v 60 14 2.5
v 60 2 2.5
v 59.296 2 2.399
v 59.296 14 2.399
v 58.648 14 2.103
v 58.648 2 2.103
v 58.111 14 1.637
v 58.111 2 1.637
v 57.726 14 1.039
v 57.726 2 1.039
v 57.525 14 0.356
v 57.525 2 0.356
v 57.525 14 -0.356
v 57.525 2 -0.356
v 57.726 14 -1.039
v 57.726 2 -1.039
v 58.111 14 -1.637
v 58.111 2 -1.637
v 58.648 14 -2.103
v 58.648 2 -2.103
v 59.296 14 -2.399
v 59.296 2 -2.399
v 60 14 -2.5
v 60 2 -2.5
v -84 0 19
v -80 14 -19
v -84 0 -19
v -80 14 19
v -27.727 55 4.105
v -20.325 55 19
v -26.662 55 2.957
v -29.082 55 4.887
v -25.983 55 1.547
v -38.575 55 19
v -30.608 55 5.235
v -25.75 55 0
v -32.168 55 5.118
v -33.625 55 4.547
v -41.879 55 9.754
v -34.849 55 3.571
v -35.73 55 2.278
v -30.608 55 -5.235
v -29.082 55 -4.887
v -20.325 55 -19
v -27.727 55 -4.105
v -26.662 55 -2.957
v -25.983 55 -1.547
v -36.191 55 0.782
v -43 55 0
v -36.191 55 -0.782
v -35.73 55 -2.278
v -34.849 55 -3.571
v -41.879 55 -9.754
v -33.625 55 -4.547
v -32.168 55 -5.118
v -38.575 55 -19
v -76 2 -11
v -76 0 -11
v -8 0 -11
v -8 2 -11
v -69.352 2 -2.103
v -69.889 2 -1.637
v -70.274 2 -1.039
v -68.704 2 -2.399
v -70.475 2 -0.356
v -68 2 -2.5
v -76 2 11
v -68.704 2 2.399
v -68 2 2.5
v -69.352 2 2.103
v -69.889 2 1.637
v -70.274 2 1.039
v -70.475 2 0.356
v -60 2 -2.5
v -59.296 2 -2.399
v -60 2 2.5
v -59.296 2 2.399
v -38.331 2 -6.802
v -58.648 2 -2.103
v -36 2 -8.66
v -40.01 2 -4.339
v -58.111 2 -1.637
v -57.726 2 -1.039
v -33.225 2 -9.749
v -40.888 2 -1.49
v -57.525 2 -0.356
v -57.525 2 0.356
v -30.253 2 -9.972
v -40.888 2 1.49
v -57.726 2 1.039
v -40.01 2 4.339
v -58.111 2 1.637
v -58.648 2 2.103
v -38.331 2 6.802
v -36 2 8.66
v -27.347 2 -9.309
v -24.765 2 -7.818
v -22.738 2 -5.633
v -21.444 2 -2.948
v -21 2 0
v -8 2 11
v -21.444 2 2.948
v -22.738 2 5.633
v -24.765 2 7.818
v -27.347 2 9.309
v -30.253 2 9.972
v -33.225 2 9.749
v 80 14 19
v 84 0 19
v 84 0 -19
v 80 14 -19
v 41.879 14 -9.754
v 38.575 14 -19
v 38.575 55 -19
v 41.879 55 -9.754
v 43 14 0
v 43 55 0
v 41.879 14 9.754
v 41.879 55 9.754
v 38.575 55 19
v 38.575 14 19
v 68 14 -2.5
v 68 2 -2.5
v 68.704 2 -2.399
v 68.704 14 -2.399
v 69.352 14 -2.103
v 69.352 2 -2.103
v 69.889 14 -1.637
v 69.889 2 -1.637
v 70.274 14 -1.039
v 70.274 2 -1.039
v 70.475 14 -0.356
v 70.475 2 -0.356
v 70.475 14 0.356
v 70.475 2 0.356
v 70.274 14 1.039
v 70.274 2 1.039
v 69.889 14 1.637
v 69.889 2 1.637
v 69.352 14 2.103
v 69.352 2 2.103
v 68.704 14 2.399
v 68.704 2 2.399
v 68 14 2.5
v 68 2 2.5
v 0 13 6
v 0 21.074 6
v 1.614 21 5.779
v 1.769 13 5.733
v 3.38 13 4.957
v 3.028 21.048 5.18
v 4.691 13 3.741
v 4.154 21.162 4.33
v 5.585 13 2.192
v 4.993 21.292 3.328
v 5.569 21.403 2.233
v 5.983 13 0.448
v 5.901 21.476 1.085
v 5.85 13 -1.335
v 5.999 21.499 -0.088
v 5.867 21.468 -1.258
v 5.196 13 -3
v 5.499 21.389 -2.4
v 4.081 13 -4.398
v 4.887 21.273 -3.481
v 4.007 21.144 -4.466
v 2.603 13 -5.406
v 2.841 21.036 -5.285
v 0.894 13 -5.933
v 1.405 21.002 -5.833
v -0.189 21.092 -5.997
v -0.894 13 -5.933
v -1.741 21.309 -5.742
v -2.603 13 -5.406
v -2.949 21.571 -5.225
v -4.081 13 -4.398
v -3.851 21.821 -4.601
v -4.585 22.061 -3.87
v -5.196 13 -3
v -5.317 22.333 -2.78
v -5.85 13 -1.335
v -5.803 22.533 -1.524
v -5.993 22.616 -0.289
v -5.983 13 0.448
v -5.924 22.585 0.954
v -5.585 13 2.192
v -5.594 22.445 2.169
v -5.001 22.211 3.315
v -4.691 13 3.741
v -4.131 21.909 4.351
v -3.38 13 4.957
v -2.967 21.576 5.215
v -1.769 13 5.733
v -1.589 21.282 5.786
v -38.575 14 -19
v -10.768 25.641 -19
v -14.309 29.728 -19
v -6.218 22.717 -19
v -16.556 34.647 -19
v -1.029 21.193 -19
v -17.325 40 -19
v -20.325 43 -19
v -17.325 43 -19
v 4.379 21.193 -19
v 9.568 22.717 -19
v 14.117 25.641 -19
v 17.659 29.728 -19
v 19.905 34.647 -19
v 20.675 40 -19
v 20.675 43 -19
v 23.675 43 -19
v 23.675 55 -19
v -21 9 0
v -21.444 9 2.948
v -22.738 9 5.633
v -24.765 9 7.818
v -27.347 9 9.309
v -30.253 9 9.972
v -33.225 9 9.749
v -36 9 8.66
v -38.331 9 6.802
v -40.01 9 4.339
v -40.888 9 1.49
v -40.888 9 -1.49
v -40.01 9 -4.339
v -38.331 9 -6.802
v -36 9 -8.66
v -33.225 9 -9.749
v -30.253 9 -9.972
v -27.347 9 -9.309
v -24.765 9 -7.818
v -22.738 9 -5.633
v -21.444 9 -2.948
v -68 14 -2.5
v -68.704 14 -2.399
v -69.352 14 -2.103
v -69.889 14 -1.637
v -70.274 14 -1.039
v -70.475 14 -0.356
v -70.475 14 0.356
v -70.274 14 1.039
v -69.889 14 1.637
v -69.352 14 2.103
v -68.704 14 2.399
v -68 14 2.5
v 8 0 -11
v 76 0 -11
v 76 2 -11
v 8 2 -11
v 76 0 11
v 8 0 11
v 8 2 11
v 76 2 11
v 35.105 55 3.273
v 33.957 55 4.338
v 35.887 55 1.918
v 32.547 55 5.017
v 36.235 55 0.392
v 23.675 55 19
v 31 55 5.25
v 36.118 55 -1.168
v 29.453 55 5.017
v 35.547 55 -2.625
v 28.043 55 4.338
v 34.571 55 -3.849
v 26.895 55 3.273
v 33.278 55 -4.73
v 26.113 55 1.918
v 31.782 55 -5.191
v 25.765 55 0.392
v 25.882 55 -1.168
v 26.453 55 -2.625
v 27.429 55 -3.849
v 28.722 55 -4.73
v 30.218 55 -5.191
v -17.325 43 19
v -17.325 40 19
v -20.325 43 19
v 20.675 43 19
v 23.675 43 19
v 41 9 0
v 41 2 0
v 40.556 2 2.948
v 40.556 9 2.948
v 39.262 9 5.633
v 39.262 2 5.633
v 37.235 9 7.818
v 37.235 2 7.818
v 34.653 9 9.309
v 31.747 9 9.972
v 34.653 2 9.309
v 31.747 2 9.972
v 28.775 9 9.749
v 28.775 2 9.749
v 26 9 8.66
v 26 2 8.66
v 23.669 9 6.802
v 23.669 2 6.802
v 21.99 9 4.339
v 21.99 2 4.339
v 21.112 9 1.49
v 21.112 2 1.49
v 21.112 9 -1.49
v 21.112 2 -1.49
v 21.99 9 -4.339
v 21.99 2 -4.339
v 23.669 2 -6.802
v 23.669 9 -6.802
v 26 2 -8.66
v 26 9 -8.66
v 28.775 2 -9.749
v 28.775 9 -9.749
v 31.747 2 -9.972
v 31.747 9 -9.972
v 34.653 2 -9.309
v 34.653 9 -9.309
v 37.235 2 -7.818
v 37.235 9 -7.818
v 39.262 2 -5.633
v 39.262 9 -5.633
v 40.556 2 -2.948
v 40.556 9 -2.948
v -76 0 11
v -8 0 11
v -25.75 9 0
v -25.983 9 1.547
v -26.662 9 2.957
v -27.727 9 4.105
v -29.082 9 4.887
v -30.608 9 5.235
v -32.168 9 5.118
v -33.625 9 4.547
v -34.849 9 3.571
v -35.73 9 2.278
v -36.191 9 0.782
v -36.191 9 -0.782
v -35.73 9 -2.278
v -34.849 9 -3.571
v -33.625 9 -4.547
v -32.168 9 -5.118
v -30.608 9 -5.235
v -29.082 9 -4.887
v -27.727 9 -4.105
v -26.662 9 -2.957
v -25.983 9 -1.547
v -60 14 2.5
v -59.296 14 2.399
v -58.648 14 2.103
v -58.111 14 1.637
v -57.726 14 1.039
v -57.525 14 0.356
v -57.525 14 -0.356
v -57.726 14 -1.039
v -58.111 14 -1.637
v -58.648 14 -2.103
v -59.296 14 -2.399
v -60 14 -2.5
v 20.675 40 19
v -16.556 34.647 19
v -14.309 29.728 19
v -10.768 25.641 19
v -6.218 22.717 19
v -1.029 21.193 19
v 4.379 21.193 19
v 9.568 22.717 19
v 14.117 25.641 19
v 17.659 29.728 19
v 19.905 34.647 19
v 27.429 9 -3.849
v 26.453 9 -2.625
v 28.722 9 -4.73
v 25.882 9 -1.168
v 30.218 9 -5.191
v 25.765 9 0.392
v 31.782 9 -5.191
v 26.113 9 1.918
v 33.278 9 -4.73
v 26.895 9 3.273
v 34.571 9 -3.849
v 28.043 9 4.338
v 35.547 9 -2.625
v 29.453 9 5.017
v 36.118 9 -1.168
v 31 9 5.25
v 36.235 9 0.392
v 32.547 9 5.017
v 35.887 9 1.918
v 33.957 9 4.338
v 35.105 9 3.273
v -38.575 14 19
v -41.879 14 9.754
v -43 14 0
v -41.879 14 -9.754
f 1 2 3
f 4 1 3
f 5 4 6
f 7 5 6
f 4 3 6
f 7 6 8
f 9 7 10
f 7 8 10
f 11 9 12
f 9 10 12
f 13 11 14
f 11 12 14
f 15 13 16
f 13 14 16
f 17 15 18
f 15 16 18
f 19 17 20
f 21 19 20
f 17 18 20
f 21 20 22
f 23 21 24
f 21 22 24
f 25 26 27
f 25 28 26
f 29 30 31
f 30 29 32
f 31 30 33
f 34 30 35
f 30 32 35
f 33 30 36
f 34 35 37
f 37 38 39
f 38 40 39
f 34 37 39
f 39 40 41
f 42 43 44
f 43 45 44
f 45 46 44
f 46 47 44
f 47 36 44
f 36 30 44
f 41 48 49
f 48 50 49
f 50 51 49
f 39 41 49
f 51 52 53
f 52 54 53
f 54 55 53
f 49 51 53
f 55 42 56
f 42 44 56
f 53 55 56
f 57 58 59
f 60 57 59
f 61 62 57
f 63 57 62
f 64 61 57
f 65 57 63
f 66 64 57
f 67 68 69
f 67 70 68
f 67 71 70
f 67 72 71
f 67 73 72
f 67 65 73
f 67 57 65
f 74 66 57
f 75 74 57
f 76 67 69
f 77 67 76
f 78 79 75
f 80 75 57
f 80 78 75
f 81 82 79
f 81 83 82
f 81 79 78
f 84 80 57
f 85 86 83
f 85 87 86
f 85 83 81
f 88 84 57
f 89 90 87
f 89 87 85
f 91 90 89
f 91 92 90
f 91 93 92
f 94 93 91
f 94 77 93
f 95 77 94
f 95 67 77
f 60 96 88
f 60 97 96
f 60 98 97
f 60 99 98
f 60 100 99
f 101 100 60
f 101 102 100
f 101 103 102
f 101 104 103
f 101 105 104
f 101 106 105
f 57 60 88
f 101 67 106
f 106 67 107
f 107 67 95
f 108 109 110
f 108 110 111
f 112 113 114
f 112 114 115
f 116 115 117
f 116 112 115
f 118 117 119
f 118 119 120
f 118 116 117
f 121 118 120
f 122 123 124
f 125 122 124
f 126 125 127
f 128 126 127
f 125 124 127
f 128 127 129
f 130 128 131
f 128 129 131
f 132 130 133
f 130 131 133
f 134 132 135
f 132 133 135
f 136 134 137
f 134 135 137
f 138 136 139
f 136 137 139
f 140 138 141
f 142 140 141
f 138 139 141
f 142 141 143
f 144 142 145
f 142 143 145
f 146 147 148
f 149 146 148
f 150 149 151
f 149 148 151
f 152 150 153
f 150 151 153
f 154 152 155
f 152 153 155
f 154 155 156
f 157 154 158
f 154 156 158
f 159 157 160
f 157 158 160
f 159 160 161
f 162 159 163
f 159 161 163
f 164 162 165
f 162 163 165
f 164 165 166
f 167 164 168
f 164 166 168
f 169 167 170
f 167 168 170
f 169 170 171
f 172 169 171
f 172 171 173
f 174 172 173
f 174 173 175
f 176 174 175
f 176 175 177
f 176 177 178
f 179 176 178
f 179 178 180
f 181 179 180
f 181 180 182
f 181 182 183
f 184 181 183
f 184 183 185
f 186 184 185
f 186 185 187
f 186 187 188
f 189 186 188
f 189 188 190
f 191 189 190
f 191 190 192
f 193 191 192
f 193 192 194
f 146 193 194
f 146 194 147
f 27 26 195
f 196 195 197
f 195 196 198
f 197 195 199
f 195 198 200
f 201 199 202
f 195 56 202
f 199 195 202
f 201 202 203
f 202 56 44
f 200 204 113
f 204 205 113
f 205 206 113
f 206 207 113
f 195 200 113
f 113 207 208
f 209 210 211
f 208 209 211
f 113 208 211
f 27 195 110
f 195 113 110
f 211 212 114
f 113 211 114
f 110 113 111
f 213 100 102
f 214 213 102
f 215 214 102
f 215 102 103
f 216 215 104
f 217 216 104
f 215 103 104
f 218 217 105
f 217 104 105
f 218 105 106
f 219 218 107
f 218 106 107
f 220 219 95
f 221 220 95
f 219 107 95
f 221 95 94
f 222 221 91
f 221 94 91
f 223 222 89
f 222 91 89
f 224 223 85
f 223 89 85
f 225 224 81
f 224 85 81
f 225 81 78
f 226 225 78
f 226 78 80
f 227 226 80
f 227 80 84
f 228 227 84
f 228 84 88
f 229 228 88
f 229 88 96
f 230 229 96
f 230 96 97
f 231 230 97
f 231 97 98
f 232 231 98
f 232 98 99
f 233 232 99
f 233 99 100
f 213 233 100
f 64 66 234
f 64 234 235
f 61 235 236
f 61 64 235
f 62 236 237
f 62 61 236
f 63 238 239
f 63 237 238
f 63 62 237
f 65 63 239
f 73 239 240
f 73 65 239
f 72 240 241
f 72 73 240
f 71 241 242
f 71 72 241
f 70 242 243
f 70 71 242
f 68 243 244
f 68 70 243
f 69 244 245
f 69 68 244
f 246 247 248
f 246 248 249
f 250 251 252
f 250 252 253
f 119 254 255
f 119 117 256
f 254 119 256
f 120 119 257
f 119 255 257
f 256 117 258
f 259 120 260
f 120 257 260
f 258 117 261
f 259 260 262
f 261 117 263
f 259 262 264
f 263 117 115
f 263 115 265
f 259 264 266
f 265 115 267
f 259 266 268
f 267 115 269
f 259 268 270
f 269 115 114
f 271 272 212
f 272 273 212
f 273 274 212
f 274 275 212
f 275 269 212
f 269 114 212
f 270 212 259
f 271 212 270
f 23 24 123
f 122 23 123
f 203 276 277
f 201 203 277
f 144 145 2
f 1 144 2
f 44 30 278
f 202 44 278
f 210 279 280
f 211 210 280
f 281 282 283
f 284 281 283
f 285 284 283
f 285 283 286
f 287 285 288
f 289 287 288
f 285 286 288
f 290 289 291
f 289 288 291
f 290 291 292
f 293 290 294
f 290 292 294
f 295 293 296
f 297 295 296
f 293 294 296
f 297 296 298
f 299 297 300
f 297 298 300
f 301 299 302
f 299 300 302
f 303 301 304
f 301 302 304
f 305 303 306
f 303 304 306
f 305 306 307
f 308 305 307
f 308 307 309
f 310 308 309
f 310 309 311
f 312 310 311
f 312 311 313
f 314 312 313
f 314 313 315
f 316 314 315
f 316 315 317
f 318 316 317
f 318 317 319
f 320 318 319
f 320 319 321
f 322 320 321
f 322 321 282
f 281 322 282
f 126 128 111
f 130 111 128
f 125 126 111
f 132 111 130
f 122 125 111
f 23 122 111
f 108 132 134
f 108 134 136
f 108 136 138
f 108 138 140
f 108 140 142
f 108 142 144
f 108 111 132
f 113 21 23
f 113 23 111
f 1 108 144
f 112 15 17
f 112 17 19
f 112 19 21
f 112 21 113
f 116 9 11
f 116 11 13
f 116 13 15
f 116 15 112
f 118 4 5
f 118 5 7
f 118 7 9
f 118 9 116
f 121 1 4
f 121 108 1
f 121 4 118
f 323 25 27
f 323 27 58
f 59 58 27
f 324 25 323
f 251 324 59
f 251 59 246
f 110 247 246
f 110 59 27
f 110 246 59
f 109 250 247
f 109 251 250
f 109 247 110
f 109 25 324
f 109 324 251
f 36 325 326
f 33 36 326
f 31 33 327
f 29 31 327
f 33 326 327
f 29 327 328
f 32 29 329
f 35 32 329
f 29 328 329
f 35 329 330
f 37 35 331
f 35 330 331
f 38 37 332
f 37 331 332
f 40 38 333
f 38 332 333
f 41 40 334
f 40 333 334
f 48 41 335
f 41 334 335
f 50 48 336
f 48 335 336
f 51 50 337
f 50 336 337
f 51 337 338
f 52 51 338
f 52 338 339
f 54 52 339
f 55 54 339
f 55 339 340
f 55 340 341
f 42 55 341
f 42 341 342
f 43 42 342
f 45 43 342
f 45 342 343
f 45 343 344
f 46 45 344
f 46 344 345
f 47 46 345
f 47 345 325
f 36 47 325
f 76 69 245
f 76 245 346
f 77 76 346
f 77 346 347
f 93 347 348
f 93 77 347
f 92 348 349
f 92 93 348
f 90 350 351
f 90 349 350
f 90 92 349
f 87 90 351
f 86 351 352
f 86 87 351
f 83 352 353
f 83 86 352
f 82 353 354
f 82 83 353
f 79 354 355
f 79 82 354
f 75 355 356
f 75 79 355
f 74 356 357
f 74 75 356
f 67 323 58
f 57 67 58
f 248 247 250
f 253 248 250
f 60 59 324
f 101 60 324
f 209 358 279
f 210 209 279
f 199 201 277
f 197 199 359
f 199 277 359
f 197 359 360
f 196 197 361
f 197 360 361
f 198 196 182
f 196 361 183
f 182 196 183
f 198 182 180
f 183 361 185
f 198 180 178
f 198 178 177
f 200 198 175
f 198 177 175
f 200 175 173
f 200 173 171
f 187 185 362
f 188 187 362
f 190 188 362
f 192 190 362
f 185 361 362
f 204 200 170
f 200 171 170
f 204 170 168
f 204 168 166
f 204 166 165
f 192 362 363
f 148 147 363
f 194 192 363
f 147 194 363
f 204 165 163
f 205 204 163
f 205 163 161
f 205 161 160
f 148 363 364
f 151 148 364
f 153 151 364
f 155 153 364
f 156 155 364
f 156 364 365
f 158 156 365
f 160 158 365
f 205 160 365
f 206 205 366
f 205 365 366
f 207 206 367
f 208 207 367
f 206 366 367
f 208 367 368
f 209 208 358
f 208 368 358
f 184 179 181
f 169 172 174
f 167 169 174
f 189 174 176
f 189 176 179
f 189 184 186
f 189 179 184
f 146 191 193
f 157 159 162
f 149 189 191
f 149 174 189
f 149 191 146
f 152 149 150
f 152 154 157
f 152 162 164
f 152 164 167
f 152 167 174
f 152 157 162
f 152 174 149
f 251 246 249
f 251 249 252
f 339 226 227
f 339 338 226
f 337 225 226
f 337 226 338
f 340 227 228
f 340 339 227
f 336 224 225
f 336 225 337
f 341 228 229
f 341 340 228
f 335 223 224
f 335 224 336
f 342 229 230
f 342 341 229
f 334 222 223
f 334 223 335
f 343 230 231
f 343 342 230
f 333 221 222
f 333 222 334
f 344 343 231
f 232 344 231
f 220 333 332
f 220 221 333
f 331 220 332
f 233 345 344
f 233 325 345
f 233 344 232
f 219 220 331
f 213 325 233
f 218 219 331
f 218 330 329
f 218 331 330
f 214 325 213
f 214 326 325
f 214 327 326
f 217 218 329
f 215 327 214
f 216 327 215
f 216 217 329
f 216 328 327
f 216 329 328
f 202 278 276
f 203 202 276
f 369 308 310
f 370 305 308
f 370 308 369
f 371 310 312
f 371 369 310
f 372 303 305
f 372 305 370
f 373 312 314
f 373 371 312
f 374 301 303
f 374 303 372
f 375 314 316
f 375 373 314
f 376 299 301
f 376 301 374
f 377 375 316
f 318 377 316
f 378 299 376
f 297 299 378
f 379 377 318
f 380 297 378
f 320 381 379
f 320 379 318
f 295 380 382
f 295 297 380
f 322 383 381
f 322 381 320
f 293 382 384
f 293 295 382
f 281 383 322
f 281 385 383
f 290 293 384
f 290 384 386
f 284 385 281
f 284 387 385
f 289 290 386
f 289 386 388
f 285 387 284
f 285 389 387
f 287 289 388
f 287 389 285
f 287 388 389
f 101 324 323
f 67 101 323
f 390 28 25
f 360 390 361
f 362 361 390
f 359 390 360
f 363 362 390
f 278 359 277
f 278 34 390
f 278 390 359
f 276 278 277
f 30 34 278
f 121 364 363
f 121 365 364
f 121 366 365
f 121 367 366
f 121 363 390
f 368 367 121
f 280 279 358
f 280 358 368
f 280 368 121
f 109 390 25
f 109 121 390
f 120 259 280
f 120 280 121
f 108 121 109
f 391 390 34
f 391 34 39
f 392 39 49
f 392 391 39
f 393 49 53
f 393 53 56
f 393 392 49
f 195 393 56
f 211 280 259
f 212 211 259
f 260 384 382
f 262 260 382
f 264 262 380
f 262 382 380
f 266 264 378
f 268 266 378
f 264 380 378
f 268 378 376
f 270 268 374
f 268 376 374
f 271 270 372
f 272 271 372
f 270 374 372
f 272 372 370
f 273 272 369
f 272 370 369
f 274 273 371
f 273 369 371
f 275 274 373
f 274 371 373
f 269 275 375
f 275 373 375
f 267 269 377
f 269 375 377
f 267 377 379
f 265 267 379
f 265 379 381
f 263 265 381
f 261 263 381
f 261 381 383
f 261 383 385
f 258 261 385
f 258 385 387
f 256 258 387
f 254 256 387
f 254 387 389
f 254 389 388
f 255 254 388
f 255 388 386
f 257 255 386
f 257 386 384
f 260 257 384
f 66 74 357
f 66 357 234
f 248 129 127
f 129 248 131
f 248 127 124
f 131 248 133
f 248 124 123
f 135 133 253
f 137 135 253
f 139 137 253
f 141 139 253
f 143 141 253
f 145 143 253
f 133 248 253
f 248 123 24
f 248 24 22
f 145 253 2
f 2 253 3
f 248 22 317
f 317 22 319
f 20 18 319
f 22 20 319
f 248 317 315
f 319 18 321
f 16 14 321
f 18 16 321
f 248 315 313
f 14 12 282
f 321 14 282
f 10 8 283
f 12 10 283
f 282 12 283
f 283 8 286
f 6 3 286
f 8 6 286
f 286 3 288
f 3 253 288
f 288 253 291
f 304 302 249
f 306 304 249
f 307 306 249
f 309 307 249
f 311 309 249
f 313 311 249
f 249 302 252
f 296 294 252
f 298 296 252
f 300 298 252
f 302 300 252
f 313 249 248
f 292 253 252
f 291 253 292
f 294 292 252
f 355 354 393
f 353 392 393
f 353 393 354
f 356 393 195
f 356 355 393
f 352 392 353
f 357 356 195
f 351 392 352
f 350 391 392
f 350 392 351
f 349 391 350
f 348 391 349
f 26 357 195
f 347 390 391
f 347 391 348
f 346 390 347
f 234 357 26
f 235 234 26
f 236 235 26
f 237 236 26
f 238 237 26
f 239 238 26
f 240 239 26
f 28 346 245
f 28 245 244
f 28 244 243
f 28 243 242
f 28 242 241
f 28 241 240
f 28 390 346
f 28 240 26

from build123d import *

# Parameters (mm, degrees)
BOSS_EXTRUDE1_DEPTH = 19
CUT_EXTRUDE2_DEPTH  = 2
BOSS_EXTRUDE2_DEPTH = 41
CUT_EXTRUDE3_DEPTH  = 62
SKETCH6_R           = 5.25
CUT_EXTRUDE4_DEPTH  = 72
SKETCH7_R           = 10
CUT_EXTRUDE5_DEPTH  = 9
SKETCH8_R           = 6
CUT_EXTRUDE6_DEPTH  = 42


with BuildPart() as part:
    # Sketch2 → Boss-Extrude1 (new, symmetric)
    with BuildSketch(Plane.XY):
        Polygon((-84, 0), (0, 0), (84, 0), (80, 14), (-80, 14), align=None)
    extrude(amount=BOSS_EXTRUDE1_DEPTH, both=True)

    # Sketch3 → Cut-Extrude2 (cut)
    with BuildSketch(Plane.XZ):
        Polygon((-76, 11), (-76, 0), (-76, -11), (-8, -11), (-8, 11), align=None)
        Polygon((76, 0), (76, -11), (8, -11), (8, 11), (76, 11), align=None)
    extrude(amount=-CUT_EXTRUDE2_DEPTH, mode=Mode.SUBTRACT)

    # Sketch4 → Boss-Extrude2 (add)
    with BuildSketch(Plane(origin=(0, 14, 0), x_dir=(1, 0, 0), z_dir=(0, 1, 0))):
        with BuildLine():
            Line((-38.574603044, 19), (38.574603044, 19))
            ThreePointArc((38.574603044, 19), (43, 0), (38.574603044, -19))
            Line((38.574603044, -19), (-38.574603044, -19))
            ThreePointArc((-38.574603044, -19), (-43, 0), (-38.574603044, 19))
        make_face()
    extrude(amount=BOSS_EXTRUDE2_DEPTH)

    # Sketch5 → Cut-Extrude3 (cut)
    with BuildSketch(Plane.XY.offset(19)):
        with BuildLine():
            Line((20.674705774, 39.999892181), (20.674705774, 43))
            Line((20.674705774, 43), (23.674705774, 43))
            Line((23.674705774, 43), (23.674705774, 55))
            Line((23.674705774, 55), (-20.325294226, 55))
            Line((-20.325294226, 55), (-20.325294226, 43))
            Line((-20.325294226, 43), (-17.325294226, 43))
            Line((-17.325294226, 43), (-17.325294226, 39.999892181))
            ThreePointArc((-17.325294226, 39.999892181), (1.674705774, 20.999892181), (20.674705774, 39.999892181))
        make_face()
    extrude(amount=-CUT_EXTRUDE3_DEPTH, mode=Mode.SUBTRACT)

    # Sketch6 → Cut-Extrude4 (cut)
    with BuildSketch(Plane.XZ):
        with Locations((-31, 0)):
            Circle(SKETCH6_R)
        with Locations(Location((31, 0, 0), (0, 0, 90))):
            Circle(SKETCH6_R)
        with BuildLine():
            Line((68, 2.5), (60, 2.5))
            ThreePointArc((60, 2.5), (57.5, 0), (60, -2.5))
            Line((60, -2.5), (68, -2.5))
            ThreePointArc((68, -2.5), (70.5, 0), (68, 2.5))
        make_face()
        with BuildLine():
            Line((-68, 2.5), (-60, 2.5))
            ThreePointArc((-60, 2.5), (-57.5, 0), (-60, -2.5))
            Line((-60, -2.5), (-68, -2.5))
            ThreePointArc((-68, -2.5), (-70.5, 0), (-68, 2.5))
        make_face()
    extrude(amount=-CUT_EXTRUDE4_DEPTH, mode=Mode.SUBTRACT)

    # Sketch7 → Cut-Extrude5 (cut)
    with BuildSketch(Plane.XZ):
        with Locations((-31, 0)):
            Circle(SKETCH7_R)
        with Locations((31, 0)):
            Circle(SKETCH7_R)
    extrude(amount=-CUT_EXTRUDE5_DEPTH, mode=Mode.SUBTRACT)

    # Sketch8 → Cut-Extrude6 (cut)
    with BuildSketch(Plane(origin=(0, 55, 0), x_dir=(1, 0, 0), z_dir=(0, 1, 0))):
        with Locations(Location((0, 0, 0), (0, 0, 270))):
            Circle(SKETCH8_R)
    extrude(amount=-CUT_EXTRUDE6_DEPTH, mode=Mode.SUBTRACT)


solid = part.part
